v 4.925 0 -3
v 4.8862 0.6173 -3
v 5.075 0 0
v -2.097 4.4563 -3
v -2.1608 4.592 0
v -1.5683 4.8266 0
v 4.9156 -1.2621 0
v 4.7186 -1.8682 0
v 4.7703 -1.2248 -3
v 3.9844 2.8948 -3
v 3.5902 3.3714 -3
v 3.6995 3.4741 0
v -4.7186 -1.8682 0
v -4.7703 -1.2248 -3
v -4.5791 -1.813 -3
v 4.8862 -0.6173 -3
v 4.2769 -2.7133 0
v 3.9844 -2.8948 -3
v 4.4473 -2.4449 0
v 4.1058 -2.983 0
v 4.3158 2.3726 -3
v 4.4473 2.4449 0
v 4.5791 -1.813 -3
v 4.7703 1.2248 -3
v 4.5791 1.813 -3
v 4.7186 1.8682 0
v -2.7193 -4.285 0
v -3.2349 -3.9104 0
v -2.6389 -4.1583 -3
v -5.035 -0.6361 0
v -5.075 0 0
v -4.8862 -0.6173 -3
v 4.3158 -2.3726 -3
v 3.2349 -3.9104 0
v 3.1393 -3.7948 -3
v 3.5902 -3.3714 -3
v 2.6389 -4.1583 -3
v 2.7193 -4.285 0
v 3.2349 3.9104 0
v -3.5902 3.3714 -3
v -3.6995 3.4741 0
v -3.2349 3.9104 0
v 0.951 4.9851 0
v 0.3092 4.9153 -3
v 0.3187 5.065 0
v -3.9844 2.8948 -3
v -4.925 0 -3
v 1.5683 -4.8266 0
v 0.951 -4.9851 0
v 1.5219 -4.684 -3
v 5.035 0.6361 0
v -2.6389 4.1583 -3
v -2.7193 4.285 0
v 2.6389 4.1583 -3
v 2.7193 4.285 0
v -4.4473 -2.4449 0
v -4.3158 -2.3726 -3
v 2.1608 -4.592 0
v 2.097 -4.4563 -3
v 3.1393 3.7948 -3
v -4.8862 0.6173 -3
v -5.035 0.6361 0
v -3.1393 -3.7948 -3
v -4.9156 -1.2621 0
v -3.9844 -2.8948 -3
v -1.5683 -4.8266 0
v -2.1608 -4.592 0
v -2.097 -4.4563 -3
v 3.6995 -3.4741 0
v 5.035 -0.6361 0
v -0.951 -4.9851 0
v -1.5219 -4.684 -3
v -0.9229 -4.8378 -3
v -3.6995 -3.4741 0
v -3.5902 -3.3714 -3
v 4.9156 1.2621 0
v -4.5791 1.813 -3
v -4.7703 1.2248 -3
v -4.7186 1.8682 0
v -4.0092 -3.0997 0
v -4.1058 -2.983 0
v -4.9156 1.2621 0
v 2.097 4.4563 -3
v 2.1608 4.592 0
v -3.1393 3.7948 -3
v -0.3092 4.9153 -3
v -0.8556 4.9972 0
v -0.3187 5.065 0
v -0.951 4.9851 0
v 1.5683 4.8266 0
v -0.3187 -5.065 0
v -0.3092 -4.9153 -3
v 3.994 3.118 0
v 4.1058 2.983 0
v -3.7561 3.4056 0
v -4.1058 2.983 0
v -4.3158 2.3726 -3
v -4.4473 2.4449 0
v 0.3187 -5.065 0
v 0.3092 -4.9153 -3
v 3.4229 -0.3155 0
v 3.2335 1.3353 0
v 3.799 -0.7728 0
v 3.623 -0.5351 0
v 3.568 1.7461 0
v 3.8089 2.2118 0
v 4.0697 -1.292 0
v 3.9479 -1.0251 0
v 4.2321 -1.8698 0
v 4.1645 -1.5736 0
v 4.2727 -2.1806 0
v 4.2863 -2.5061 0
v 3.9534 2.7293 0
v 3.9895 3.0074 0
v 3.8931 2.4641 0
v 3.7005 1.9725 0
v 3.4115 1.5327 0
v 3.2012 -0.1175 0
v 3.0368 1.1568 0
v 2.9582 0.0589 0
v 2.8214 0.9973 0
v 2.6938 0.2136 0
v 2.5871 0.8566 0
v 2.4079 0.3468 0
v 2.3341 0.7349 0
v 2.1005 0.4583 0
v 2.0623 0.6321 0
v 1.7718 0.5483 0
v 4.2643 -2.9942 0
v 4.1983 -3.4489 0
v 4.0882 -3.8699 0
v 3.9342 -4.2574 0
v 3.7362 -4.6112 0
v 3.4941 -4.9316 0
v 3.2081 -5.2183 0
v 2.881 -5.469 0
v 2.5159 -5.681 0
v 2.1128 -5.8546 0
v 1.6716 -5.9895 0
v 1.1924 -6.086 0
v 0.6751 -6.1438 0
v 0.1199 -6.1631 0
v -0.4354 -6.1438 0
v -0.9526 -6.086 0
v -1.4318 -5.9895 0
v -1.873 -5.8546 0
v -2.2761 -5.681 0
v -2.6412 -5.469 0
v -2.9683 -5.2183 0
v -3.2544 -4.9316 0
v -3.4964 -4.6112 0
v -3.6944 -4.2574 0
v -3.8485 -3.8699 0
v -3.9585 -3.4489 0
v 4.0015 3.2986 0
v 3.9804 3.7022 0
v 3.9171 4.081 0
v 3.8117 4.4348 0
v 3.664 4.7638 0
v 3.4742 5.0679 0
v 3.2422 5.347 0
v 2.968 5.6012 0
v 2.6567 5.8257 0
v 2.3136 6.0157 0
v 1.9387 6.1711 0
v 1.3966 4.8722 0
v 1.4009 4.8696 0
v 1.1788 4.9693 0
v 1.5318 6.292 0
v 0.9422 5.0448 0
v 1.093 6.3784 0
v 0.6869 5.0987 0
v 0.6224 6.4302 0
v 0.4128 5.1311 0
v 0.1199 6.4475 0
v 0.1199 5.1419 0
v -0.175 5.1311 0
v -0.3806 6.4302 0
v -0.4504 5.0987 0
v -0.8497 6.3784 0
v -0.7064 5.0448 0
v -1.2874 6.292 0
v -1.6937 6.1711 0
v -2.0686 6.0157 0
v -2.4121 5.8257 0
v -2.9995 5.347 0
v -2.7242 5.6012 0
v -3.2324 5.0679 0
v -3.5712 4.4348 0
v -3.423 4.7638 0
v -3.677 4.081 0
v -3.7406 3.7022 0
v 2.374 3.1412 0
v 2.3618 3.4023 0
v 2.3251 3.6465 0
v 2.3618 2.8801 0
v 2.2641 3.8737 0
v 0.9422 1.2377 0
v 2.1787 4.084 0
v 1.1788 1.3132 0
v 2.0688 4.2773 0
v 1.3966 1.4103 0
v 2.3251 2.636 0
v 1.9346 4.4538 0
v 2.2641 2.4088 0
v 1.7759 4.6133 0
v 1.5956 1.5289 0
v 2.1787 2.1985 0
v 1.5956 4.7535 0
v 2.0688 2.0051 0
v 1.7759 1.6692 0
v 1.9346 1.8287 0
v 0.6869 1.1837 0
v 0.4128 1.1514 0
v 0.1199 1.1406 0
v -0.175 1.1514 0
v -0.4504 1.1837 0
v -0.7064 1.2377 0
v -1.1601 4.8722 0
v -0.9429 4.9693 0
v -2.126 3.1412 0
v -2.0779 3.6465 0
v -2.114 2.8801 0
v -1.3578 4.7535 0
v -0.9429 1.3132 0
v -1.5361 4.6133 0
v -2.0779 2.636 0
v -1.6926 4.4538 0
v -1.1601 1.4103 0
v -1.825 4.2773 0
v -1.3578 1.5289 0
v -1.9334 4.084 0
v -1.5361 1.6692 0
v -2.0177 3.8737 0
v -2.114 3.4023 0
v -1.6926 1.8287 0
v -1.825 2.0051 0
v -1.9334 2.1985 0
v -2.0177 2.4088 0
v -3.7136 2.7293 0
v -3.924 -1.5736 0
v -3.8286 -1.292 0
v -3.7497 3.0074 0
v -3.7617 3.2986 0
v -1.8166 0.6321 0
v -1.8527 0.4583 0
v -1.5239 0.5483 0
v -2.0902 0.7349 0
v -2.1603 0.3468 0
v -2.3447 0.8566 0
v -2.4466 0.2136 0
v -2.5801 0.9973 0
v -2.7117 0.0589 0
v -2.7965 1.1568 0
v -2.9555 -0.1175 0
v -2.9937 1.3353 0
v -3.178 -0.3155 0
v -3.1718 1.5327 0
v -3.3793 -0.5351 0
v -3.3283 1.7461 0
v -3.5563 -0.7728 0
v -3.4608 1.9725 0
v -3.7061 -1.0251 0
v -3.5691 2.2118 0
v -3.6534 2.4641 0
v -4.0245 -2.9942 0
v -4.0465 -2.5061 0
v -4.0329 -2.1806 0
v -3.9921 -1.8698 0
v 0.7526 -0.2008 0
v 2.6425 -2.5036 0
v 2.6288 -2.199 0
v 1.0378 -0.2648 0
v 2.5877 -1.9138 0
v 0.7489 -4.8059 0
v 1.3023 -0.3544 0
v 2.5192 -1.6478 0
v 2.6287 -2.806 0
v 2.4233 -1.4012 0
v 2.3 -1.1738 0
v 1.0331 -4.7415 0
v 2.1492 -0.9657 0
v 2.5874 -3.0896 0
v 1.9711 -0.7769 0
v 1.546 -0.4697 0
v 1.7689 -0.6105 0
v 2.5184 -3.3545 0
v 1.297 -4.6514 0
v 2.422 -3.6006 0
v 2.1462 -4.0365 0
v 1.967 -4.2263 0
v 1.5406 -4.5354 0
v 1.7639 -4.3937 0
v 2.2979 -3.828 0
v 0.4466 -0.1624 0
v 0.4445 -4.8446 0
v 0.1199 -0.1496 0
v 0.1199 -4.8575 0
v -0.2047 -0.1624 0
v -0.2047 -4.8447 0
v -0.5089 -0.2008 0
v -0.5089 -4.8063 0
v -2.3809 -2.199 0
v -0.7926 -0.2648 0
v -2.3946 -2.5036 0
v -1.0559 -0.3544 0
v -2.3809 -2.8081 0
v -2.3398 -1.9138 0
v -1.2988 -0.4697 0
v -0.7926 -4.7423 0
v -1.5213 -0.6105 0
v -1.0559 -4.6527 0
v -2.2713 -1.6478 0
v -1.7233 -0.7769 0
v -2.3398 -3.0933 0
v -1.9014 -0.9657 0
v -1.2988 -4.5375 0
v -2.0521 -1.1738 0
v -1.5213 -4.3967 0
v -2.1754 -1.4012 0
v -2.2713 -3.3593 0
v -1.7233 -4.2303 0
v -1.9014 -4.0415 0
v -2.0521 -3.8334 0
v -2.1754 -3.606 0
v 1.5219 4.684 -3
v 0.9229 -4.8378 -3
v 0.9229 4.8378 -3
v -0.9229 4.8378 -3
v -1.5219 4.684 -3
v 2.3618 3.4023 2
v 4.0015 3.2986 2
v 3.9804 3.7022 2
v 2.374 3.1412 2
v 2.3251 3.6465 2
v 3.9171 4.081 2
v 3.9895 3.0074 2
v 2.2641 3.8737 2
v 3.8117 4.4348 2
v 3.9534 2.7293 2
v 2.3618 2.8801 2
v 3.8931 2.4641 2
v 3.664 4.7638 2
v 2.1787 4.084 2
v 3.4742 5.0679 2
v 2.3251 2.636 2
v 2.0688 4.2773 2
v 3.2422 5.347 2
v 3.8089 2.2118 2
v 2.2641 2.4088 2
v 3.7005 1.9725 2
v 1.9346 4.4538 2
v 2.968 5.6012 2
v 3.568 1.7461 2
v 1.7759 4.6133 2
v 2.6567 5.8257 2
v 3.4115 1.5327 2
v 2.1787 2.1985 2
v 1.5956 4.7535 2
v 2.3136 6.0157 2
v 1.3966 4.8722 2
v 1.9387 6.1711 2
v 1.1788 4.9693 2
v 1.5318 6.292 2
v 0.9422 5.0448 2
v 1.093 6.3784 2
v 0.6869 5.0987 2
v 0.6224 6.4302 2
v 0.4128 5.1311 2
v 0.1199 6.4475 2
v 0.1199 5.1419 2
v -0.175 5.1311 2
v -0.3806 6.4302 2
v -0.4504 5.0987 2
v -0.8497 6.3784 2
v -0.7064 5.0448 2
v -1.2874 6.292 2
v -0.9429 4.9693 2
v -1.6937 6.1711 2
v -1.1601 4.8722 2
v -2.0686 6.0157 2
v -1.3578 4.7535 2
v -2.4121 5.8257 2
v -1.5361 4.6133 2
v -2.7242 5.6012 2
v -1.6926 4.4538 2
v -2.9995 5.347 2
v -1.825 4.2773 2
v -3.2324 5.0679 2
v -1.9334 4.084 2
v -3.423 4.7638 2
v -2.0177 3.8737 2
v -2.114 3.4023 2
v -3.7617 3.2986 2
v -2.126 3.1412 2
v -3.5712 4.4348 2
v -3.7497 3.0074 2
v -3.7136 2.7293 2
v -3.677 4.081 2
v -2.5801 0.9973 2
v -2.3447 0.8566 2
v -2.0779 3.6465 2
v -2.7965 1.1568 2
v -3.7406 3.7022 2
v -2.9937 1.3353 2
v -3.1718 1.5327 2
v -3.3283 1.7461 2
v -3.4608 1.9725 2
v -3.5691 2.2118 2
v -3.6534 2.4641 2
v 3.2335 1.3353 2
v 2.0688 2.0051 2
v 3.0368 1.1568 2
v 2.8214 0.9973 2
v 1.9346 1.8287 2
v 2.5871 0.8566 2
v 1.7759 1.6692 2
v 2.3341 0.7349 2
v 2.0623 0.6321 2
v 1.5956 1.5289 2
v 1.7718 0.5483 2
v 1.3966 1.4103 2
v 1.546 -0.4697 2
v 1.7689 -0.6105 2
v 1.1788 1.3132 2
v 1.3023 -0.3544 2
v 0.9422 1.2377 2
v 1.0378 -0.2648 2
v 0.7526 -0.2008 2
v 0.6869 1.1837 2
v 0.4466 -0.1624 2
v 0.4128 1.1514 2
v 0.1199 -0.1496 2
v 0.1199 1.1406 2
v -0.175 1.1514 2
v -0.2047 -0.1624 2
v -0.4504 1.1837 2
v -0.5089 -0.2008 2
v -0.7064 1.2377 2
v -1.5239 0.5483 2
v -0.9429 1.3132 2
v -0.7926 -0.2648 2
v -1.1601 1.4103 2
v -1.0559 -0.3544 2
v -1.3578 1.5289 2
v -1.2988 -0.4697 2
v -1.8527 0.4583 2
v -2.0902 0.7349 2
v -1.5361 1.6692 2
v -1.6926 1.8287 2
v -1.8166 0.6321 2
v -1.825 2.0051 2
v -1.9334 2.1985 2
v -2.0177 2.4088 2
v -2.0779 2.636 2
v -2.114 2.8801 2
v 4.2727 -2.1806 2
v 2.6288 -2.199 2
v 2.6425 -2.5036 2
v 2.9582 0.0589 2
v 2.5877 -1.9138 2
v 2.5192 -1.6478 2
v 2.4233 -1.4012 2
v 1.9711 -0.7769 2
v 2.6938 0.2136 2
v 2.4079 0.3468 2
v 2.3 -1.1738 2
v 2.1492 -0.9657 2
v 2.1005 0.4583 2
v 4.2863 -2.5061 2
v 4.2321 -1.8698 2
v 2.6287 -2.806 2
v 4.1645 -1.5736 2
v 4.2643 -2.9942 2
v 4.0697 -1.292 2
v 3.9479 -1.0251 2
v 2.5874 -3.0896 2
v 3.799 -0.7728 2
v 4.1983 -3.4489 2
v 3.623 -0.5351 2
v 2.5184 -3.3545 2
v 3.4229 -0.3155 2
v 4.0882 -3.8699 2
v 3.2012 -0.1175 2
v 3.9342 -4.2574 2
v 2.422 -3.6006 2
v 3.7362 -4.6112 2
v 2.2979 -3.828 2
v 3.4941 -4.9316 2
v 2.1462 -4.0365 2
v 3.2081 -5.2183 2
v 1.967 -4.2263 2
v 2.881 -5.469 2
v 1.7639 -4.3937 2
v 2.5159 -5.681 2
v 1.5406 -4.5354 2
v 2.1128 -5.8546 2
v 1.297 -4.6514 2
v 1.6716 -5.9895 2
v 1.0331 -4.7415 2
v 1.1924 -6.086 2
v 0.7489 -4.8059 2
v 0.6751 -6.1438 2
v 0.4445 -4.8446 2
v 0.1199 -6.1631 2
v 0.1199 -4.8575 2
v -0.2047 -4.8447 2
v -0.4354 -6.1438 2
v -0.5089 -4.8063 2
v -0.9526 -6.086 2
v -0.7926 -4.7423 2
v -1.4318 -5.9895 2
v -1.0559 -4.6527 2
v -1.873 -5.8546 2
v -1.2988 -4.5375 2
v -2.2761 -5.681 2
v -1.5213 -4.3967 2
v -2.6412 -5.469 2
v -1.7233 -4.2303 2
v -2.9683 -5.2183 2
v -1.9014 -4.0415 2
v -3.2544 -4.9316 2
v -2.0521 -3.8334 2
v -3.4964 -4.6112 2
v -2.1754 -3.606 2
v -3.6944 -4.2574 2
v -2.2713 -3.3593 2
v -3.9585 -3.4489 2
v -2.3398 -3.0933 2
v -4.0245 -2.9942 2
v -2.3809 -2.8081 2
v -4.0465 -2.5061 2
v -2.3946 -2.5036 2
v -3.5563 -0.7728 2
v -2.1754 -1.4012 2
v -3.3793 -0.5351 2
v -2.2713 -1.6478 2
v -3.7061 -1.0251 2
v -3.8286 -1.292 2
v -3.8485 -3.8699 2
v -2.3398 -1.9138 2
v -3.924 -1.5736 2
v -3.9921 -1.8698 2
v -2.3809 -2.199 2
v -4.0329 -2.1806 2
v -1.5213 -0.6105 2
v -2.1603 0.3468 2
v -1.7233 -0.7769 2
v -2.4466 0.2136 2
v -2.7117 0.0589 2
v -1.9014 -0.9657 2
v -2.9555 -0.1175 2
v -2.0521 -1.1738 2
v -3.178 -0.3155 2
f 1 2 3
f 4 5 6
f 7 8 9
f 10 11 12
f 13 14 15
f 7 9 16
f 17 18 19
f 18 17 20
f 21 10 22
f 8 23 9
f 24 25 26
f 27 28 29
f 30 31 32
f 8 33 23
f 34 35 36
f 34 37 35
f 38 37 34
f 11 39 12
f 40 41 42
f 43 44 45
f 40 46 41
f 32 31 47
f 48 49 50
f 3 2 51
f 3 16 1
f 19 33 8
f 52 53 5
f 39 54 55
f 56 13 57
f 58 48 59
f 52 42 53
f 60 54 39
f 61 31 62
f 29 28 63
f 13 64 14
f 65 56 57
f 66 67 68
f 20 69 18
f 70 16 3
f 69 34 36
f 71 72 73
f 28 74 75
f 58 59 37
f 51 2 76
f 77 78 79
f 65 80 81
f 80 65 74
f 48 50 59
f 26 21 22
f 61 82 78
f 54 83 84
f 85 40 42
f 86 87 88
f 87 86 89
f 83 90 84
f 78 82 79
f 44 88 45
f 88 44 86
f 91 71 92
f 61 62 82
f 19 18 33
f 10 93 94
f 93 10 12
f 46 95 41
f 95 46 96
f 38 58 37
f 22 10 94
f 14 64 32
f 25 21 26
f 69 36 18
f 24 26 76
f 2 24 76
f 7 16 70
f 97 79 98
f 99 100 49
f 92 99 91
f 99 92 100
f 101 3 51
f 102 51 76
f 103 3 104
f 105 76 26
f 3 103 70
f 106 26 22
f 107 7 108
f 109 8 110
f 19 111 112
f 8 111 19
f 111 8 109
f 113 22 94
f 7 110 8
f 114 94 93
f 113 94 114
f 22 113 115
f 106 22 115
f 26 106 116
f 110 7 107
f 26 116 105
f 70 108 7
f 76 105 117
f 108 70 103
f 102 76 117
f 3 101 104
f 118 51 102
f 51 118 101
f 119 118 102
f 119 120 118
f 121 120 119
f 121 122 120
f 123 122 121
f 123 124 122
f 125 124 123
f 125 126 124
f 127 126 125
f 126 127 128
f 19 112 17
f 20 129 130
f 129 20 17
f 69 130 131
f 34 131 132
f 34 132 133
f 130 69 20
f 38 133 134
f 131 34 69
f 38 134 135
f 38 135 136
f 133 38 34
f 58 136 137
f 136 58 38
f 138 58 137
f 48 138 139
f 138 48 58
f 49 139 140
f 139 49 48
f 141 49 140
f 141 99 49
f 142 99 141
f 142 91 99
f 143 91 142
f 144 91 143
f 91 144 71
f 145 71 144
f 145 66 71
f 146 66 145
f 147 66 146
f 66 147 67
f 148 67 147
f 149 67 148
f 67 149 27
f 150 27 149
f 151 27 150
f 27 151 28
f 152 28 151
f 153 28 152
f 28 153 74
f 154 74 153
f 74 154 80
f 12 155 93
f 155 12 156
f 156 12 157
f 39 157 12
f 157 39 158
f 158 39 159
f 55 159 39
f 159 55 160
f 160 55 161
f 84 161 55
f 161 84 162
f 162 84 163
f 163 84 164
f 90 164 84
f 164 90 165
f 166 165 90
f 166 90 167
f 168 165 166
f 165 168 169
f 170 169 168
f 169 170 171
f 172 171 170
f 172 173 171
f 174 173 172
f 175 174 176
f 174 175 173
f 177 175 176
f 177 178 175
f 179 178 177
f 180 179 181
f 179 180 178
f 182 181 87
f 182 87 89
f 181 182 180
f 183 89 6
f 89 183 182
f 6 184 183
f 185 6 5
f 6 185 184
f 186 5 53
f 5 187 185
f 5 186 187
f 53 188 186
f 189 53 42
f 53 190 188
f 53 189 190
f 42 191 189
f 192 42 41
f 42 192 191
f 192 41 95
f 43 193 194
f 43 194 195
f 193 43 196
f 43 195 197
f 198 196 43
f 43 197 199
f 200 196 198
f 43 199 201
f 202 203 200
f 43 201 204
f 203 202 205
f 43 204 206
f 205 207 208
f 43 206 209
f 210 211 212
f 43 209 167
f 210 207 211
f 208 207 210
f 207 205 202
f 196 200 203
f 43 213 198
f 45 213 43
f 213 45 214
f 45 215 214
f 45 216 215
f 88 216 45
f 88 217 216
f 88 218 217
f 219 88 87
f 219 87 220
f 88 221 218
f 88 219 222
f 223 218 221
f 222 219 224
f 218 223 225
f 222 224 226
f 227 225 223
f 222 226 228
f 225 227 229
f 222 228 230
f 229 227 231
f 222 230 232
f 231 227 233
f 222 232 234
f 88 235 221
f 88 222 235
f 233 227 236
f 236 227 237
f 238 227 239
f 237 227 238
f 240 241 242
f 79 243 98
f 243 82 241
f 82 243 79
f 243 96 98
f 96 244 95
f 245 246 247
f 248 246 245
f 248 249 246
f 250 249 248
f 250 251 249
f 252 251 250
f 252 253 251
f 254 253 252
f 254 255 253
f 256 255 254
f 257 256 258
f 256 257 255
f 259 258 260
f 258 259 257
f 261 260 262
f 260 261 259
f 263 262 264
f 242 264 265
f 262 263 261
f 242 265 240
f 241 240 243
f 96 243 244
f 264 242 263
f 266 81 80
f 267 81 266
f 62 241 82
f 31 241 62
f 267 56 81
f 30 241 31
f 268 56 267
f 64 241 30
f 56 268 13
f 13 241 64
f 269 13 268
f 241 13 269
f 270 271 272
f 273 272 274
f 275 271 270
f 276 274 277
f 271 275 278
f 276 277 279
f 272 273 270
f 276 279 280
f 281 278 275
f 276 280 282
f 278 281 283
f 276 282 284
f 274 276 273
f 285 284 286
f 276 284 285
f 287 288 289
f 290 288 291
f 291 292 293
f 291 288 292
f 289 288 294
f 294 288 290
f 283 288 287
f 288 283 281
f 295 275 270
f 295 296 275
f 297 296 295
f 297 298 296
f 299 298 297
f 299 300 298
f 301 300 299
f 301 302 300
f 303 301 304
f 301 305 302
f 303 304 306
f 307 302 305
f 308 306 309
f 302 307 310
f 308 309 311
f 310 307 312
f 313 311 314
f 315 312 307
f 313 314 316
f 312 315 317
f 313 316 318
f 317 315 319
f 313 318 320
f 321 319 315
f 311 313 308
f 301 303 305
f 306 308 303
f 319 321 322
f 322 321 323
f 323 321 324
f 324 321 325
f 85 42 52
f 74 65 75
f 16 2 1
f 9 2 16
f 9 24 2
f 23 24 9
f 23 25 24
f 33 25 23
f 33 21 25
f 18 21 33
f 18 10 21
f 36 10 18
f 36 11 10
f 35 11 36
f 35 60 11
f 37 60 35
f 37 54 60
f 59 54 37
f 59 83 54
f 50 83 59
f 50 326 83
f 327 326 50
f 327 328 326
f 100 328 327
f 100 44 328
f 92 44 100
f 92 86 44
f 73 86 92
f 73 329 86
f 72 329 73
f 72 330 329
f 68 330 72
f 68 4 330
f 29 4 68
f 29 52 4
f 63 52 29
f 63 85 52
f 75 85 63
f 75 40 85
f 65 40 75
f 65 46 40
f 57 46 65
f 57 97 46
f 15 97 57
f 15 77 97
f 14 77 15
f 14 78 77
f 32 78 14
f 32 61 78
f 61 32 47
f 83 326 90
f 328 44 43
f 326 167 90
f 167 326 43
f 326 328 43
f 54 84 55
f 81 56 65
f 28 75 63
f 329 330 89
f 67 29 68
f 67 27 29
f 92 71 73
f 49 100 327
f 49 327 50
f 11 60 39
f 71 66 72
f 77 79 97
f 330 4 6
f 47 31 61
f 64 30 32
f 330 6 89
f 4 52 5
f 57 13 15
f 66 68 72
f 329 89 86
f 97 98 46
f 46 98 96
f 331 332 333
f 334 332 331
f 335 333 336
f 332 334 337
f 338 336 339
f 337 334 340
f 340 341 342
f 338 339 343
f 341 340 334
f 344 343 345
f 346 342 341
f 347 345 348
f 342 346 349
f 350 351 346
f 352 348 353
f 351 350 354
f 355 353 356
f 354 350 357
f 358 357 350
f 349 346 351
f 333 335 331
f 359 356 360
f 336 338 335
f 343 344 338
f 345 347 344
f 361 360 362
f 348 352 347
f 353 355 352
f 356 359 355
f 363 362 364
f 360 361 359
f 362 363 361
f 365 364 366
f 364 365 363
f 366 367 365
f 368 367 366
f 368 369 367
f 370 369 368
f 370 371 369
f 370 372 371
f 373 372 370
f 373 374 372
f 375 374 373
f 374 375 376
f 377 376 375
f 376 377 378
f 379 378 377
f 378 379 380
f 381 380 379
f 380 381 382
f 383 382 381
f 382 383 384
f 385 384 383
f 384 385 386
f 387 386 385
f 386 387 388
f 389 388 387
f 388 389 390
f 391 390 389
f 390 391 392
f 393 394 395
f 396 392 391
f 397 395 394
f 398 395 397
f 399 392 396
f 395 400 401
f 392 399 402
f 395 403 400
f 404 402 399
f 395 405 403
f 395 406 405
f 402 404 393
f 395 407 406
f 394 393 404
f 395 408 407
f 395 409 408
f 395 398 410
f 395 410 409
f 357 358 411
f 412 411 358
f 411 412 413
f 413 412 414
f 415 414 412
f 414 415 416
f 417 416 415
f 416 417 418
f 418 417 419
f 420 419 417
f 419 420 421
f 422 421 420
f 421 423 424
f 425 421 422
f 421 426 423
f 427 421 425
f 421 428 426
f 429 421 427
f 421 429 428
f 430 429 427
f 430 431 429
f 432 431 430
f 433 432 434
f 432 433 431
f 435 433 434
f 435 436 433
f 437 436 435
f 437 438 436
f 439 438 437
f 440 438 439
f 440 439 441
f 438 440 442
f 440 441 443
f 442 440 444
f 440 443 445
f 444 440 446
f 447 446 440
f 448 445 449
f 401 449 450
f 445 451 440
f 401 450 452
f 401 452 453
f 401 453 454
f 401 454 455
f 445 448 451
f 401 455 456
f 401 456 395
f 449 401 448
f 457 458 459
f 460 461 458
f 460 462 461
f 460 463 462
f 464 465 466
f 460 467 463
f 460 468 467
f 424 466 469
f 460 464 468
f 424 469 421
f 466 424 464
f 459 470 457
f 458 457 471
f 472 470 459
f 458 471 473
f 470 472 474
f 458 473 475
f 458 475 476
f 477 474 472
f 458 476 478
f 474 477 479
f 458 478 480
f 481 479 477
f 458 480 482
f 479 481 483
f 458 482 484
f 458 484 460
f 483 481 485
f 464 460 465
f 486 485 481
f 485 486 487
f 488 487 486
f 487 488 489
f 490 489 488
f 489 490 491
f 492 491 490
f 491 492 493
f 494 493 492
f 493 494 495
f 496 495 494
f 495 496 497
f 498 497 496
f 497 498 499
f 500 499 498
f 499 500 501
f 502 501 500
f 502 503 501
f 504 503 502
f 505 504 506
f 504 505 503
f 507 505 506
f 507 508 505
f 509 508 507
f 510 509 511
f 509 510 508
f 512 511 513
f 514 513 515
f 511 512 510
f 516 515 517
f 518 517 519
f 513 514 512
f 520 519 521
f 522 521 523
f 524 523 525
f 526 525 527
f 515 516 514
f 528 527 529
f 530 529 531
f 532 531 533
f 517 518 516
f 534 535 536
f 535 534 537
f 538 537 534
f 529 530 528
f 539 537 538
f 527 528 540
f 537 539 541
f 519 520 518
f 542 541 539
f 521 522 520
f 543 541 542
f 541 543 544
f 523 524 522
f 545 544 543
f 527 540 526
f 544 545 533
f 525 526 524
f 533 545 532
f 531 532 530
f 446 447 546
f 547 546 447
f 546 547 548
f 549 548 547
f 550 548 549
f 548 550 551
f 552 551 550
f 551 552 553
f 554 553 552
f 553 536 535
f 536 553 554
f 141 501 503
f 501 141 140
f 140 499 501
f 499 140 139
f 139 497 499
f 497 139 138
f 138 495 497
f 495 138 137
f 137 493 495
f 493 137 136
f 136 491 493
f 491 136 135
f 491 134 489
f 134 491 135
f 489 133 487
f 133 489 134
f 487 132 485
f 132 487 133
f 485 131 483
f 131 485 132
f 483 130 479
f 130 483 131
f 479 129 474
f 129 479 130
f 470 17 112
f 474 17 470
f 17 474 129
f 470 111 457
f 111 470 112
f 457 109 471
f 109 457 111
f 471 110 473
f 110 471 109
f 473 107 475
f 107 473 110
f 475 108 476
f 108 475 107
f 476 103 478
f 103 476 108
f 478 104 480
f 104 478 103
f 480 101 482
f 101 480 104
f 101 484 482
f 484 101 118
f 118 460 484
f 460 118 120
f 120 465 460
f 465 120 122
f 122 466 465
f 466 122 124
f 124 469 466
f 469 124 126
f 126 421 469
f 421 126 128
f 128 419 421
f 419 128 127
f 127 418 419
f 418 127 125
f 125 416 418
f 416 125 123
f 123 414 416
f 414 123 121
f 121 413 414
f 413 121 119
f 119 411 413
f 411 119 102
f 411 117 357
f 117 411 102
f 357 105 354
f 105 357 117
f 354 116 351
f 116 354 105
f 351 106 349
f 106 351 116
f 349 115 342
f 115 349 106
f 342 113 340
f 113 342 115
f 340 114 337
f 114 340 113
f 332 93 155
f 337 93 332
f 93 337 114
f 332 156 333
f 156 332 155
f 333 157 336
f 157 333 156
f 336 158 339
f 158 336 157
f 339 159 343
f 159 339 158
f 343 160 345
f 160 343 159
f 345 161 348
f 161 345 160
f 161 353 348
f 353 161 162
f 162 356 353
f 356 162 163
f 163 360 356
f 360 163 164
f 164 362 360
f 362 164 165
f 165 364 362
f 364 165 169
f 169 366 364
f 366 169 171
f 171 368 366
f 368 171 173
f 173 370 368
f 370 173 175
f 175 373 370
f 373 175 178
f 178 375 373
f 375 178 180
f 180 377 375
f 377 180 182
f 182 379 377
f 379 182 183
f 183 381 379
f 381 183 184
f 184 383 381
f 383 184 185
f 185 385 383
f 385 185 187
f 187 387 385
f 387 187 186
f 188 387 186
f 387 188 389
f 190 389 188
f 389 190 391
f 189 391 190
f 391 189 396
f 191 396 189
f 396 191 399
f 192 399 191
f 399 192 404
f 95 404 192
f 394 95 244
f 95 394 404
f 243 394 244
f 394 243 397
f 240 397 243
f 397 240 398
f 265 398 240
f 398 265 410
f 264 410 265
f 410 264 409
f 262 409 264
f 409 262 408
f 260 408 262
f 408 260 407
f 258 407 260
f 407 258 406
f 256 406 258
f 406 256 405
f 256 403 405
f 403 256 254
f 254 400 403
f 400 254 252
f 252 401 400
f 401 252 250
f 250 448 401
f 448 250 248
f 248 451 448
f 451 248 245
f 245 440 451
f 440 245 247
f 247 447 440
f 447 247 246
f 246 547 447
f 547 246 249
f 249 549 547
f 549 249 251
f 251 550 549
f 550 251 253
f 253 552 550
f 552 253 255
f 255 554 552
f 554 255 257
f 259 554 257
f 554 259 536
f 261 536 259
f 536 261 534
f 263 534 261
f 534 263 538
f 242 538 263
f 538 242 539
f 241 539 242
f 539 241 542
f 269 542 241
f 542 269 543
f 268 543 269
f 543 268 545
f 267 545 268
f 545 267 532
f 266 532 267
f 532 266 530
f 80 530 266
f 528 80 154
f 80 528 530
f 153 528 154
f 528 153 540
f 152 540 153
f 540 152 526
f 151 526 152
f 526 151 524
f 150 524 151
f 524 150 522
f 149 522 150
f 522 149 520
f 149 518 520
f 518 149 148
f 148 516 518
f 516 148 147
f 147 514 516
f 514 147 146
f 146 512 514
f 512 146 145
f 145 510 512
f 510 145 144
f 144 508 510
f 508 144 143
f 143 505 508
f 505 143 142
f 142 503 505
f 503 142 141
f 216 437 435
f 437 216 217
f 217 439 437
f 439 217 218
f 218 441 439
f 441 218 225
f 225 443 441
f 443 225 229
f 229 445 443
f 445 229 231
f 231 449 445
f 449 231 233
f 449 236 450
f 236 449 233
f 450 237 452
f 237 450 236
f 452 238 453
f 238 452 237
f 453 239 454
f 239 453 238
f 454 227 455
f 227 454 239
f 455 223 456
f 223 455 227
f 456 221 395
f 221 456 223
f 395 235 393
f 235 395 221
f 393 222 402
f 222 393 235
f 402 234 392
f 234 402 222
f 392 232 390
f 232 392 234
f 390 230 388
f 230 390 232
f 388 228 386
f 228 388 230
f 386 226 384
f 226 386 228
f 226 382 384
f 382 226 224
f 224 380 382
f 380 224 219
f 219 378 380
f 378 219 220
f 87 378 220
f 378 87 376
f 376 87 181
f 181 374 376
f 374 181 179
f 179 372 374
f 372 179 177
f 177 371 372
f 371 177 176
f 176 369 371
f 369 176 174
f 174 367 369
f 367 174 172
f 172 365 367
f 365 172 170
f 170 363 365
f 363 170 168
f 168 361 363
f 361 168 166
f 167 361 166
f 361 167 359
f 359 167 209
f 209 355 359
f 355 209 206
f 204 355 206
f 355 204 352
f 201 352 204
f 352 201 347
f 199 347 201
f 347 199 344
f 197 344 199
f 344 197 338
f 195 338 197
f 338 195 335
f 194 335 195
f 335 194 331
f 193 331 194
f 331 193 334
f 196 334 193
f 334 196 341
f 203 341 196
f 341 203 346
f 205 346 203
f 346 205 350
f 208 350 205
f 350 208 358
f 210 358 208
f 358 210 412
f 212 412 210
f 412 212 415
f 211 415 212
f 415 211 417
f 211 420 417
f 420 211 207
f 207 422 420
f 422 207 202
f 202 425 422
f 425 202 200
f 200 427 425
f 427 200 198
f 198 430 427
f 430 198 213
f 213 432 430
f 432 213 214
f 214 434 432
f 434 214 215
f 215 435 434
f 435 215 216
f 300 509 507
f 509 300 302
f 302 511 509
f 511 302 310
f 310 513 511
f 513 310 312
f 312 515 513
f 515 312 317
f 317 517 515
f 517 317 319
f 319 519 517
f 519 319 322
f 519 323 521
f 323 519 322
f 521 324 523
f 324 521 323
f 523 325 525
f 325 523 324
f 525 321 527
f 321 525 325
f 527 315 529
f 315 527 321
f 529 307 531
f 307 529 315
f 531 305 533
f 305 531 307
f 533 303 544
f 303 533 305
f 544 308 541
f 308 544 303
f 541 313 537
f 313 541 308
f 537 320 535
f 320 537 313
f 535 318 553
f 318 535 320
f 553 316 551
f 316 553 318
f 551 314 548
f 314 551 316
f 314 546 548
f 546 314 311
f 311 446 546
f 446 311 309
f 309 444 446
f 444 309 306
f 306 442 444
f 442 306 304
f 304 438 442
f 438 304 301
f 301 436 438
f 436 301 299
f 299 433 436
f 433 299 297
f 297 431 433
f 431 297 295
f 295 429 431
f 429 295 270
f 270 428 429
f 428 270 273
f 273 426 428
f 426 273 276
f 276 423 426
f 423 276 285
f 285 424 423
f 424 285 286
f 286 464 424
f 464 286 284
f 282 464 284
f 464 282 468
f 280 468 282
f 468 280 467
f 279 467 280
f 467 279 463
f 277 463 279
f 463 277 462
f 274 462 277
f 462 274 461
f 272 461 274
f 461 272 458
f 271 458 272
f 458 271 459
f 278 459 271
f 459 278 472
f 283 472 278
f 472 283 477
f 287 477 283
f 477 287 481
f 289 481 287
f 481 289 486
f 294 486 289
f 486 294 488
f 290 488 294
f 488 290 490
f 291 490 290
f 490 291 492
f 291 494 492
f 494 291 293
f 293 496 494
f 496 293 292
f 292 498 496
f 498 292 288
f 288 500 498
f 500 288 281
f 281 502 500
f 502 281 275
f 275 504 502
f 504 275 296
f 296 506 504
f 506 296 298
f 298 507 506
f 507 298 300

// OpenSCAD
$fn = 50;

difference() {
	union() {
		translate(v = [0, 0, -3.0]) {
			cylinder(h = 3, r1 = 4.925, r2 = 5.075);
		}
		linear_extrude(height = 2) {
			text(font = "Impact", halign = "center", size = 12, text = "8", valign = "center");
		}
	}
	union();
}
